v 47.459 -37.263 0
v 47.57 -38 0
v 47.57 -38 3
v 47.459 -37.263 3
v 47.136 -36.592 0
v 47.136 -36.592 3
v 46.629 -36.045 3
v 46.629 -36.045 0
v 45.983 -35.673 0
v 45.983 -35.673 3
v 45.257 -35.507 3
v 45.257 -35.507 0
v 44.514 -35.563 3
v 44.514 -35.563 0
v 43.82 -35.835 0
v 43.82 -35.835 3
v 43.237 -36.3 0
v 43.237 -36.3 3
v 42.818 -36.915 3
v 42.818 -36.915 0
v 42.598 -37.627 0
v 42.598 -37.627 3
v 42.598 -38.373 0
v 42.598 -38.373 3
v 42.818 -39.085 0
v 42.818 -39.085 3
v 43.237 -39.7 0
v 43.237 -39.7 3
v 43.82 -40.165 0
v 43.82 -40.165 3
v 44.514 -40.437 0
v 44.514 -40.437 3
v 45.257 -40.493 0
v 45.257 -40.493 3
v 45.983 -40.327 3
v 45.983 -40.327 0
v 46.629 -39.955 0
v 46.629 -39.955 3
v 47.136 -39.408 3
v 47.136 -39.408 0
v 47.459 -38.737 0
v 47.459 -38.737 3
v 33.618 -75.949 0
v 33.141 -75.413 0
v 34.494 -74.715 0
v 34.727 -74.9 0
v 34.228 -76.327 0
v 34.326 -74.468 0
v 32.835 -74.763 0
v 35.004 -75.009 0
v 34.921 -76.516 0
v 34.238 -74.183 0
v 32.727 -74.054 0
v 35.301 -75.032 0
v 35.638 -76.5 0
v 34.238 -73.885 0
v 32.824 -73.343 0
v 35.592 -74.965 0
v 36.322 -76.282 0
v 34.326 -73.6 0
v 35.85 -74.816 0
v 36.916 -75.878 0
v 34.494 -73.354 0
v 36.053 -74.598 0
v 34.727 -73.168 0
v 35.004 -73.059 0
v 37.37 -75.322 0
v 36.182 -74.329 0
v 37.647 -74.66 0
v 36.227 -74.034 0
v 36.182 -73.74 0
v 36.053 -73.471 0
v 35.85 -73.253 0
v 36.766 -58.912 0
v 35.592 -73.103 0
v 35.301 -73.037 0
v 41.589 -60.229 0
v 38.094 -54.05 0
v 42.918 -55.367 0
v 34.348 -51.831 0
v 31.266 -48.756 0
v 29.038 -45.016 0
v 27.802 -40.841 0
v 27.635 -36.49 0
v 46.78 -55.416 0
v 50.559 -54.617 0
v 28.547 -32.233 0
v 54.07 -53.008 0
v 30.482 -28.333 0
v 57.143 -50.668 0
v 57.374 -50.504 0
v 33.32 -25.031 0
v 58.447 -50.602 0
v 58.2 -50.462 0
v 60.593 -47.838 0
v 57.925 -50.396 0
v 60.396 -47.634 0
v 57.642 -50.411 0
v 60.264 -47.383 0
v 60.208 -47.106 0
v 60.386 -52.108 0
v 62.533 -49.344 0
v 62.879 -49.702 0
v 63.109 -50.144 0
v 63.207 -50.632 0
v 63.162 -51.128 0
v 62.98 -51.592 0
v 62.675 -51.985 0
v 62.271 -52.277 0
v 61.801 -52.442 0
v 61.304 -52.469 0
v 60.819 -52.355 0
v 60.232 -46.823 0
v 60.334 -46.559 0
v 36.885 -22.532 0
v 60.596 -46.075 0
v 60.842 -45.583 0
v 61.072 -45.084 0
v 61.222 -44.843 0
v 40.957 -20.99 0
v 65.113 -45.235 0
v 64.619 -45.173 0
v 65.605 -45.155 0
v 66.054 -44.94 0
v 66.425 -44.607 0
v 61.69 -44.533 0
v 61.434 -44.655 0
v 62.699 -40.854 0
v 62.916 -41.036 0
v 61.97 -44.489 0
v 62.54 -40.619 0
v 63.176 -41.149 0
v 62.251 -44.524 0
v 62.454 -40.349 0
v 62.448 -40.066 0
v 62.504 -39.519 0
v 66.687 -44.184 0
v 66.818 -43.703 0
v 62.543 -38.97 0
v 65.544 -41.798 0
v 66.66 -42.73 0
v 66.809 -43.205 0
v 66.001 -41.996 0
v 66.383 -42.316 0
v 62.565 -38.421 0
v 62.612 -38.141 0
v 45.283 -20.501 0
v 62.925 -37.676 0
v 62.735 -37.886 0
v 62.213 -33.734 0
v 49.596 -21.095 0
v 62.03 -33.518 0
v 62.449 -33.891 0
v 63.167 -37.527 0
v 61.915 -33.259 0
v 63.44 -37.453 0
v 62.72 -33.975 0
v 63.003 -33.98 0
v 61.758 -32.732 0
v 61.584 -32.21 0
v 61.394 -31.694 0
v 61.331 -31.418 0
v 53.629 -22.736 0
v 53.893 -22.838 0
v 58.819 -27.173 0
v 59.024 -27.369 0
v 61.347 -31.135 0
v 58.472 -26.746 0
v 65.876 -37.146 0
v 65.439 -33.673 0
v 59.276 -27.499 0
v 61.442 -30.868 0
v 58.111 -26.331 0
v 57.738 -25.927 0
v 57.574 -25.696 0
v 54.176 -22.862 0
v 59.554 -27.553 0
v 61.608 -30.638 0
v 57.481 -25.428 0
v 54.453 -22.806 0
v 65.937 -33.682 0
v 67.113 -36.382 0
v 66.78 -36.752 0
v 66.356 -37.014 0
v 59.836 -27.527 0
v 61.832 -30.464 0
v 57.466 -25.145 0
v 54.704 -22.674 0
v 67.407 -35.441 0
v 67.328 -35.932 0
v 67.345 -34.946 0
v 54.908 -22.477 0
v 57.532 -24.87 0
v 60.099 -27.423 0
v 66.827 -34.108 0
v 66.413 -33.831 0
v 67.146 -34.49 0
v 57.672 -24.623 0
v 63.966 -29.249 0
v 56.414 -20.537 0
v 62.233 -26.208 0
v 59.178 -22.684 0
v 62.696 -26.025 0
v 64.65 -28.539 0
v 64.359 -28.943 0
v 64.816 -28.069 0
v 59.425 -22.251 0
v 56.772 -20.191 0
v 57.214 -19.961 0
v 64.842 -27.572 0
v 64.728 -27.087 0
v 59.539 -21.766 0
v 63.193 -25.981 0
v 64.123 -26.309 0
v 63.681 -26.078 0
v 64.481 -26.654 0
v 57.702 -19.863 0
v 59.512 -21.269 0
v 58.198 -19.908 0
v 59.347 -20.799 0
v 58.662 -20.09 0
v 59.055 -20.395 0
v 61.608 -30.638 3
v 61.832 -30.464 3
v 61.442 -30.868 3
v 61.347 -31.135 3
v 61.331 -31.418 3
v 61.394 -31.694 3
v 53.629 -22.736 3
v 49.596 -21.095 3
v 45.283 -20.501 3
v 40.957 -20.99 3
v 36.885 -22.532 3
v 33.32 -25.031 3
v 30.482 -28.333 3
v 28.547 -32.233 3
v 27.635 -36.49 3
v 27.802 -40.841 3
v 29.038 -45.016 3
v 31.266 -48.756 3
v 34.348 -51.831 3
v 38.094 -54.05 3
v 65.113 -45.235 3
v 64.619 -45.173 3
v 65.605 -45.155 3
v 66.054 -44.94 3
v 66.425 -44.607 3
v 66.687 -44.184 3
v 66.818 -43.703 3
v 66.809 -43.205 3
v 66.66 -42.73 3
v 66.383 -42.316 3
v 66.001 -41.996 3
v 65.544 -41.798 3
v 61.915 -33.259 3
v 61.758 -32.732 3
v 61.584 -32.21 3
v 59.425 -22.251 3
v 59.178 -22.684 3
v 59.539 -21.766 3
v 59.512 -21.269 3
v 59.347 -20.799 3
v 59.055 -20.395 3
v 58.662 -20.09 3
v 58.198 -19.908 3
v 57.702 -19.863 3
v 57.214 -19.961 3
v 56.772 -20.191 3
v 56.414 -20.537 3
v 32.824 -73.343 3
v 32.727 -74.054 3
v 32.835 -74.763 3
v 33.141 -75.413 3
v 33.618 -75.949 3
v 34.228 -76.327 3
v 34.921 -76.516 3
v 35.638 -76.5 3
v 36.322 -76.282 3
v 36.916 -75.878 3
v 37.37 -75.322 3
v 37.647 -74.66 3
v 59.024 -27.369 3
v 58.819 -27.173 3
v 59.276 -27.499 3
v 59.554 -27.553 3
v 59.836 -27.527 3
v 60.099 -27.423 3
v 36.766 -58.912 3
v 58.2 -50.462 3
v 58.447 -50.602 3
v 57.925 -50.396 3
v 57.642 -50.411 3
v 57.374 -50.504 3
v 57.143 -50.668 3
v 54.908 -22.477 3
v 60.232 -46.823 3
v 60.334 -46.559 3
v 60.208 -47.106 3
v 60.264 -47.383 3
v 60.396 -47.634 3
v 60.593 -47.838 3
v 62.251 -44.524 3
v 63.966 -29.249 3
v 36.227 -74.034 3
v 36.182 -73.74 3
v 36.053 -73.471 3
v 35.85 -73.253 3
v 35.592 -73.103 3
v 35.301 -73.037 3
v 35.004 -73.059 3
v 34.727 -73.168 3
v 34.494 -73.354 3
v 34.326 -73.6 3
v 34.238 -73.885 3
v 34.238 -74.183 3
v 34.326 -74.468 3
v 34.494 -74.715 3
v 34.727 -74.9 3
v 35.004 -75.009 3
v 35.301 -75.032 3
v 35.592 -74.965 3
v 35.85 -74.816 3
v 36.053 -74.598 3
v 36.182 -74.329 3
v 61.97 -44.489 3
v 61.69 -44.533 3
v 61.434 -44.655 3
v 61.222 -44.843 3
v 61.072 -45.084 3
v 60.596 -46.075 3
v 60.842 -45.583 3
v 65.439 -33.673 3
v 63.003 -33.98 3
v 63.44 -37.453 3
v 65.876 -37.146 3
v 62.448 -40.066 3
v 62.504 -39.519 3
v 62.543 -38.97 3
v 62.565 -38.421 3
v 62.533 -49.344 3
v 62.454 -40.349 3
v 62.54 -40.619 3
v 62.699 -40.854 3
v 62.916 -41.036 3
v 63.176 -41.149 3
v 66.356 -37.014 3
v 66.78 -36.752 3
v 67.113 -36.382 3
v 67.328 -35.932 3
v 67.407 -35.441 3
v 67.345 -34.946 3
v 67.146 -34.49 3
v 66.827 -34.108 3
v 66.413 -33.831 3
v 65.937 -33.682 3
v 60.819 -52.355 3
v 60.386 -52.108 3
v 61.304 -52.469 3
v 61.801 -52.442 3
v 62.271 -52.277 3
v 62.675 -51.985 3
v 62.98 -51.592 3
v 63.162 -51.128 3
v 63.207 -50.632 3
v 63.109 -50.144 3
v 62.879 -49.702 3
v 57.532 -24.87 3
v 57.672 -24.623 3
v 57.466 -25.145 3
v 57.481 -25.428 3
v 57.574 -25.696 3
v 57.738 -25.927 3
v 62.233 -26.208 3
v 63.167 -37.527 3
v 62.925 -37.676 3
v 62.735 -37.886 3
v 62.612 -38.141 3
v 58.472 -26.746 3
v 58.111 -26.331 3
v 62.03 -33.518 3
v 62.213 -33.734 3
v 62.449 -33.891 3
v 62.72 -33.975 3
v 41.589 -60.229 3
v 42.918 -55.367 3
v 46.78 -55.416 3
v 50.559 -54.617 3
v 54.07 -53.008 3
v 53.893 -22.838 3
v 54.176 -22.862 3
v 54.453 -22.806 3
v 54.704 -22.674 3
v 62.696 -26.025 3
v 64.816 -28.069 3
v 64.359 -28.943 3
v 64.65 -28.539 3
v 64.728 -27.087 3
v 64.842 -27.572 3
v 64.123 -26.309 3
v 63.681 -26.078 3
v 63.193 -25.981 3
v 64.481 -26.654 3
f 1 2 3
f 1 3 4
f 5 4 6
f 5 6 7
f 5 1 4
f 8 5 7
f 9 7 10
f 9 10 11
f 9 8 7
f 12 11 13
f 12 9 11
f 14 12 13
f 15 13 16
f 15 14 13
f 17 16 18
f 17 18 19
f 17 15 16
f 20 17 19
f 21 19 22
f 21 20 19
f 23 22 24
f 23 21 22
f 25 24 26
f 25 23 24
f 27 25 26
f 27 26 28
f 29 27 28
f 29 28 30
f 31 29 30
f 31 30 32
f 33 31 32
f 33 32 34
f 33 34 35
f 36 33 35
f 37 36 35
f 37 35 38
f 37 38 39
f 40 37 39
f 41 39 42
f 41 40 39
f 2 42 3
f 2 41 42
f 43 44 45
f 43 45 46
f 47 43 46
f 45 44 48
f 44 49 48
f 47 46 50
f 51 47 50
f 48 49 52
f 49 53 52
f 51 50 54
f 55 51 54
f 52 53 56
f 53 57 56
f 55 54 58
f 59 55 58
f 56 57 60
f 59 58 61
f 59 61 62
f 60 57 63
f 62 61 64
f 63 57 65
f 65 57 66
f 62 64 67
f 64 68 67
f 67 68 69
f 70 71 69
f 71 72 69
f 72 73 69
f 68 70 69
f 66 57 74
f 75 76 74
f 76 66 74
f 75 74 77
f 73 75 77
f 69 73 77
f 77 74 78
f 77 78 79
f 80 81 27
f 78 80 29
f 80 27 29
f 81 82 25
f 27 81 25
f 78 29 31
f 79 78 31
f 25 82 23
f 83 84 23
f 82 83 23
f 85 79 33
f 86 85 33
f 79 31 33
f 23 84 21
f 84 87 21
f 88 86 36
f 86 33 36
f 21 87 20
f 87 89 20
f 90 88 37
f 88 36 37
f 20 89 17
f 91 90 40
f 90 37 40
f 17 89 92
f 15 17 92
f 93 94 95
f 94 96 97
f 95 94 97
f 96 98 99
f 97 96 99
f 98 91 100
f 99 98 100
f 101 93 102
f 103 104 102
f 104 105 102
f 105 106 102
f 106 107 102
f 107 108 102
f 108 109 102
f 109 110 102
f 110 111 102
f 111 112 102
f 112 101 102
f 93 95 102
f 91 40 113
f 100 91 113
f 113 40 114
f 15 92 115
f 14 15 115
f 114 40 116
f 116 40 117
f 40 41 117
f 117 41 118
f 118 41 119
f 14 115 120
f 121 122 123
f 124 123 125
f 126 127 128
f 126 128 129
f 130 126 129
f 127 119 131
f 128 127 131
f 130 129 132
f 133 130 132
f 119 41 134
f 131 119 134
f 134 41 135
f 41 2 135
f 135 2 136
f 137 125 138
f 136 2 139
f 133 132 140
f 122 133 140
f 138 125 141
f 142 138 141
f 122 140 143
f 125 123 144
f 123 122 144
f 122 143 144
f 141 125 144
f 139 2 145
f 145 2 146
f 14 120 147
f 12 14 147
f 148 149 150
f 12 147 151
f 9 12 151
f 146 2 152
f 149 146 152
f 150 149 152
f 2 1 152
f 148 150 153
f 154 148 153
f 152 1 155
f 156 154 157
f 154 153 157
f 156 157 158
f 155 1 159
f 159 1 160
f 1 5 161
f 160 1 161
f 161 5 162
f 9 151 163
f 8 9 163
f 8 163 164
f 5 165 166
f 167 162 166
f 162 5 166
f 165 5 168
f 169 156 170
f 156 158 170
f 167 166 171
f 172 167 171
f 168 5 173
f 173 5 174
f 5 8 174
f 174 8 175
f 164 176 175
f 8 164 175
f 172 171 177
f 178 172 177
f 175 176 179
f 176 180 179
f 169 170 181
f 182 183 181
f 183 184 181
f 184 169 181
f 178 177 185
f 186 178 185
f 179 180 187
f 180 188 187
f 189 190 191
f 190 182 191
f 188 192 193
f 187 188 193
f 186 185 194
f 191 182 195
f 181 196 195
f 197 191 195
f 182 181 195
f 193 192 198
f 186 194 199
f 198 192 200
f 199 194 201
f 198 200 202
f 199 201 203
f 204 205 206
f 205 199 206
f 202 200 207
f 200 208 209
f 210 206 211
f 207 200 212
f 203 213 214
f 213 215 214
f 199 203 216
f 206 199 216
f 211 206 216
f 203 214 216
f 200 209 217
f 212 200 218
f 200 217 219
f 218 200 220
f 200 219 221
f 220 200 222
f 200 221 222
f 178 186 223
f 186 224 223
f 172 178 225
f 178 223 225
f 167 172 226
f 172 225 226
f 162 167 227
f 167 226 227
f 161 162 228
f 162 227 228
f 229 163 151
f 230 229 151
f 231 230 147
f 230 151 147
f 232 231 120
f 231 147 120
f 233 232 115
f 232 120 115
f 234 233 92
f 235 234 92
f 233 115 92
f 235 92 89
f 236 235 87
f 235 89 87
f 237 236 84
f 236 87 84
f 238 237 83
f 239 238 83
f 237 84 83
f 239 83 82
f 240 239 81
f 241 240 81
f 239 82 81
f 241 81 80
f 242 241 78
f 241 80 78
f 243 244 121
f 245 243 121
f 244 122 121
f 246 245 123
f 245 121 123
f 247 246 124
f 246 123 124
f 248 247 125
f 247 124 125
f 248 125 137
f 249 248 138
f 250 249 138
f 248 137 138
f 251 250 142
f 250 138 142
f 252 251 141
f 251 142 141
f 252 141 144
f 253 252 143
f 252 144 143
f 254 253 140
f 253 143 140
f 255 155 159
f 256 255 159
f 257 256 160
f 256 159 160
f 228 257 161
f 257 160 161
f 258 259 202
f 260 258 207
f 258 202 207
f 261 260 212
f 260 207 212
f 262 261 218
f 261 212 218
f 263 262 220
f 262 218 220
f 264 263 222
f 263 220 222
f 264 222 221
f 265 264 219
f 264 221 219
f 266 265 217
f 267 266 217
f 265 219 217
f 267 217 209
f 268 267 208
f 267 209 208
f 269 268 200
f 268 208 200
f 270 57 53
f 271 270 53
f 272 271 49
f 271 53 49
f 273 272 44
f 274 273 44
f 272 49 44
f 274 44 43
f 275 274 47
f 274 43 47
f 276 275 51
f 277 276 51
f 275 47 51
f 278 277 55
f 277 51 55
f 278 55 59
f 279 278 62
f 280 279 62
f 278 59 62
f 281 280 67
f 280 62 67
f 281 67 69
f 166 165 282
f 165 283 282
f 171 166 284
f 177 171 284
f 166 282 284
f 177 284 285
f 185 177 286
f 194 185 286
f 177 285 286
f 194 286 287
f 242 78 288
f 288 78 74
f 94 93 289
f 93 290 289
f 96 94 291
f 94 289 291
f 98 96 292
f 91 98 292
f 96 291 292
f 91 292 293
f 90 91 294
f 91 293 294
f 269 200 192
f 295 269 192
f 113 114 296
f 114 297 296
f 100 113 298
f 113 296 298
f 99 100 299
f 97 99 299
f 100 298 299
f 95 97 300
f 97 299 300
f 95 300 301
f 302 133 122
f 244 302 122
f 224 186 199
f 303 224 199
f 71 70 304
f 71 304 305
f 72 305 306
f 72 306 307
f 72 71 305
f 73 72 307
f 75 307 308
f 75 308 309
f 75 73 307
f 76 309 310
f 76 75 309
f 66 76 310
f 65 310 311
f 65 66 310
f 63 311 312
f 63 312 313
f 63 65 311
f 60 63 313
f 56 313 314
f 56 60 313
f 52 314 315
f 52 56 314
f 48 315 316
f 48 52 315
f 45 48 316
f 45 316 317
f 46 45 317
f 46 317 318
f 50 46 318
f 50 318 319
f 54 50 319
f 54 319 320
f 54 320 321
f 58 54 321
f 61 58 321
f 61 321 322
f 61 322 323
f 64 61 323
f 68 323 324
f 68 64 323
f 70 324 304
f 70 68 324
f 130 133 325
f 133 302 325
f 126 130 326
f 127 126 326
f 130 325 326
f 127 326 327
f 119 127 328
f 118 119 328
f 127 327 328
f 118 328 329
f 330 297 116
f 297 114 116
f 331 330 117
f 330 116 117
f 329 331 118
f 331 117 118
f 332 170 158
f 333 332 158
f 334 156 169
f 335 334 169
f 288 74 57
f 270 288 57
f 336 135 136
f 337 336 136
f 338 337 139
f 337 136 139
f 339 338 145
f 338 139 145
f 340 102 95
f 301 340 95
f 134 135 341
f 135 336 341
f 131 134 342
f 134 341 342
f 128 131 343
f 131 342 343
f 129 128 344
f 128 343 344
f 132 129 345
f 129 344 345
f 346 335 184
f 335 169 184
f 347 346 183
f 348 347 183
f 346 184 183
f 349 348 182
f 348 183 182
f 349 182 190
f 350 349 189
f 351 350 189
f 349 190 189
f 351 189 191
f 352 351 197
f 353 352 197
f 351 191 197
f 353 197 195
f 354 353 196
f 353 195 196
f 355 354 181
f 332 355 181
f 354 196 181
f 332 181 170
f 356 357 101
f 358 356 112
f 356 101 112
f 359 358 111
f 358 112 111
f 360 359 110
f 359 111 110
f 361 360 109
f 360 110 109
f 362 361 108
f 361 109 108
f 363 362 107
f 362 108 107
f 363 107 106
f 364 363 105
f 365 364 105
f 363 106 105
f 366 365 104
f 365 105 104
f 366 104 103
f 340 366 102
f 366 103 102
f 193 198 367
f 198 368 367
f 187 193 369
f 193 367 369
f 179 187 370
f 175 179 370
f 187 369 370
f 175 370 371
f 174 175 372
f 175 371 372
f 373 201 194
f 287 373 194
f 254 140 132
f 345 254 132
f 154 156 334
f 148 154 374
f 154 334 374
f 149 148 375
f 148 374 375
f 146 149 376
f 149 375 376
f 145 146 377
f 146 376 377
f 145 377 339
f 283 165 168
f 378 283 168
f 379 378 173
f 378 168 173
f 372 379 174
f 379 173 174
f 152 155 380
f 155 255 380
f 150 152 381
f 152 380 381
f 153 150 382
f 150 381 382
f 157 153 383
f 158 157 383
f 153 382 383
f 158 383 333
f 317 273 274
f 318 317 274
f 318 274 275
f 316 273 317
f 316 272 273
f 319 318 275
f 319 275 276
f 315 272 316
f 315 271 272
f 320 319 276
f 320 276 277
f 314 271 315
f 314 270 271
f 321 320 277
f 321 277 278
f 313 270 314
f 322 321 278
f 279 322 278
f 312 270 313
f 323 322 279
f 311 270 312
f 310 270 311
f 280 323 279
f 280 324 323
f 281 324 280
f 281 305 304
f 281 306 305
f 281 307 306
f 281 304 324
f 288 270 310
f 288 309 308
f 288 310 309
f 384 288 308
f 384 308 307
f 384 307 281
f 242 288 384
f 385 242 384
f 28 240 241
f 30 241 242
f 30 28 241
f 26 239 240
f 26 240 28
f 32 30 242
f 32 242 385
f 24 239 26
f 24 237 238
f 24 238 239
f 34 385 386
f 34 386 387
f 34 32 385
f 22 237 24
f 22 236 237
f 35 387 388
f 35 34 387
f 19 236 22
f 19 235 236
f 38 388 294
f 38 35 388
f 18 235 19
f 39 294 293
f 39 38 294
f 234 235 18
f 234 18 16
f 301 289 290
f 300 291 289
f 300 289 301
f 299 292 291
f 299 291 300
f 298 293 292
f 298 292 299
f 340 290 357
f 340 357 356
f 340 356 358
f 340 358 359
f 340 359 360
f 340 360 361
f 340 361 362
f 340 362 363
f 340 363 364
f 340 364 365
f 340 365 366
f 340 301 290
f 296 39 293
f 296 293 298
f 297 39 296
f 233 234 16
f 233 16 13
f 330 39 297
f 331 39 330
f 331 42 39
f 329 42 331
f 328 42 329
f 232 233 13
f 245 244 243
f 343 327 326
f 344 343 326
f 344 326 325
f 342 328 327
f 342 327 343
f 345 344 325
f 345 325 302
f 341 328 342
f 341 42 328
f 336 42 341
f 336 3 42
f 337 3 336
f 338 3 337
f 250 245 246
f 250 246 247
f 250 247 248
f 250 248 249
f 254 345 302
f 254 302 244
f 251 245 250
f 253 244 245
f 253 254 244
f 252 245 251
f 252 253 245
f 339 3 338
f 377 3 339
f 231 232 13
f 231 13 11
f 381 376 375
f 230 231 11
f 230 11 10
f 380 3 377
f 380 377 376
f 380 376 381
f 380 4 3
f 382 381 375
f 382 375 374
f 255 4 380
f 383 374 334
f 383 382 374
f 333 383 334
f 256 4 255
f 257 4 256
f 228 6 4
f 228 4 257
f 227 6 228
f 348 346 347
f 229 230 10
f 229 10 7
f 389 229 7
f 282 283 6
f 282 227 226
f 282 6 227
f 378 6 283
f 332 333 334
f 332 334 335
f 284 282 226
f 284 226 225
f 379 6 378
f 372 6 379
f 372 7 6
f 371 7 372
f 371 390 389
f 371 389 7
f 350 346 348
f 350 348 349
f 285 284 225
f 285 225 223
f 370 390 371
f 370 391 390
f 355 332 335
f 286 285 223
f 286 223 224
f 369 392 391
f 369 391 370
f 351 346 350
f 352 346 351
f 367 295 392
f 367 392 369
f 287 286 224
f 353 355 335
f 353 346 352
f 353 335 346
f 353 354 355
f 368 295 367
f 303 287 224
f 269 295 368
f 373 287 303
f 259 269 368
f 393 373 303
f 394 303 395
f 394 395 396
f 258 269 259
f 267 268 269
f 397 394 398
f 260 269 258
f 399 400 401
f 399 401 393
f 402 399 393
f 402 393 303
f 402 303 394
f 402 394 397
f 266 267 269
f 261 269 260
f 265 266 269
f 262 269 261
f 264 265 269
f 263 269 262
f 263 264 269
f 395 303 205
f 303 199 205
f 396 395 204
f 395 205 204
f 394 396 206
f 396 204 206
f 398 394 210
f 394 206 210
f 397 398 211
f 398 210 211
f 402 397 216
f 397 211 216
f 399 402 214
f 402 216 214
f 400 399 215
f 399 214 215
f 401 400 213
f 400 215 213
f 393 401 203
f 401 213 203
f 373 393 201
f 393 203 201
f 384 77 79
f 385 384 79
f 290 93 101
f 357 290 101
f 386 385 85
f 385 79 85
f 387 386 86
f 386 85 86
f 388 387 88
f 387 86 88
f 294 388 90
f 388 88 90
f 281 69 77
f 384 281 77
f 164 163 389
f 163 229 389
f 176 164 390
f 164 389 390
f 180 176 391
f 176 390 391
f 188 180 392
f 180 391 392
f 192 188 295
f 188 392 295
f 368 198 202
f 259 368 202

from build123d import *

# Parameters (mm, degrees)
SKETCH1_R           = 17.5
SKETCH1_R_2         = 2.5
SKETCH1_R_3         = 1.75
SKETCH1_R_4         = 1
BOSS_EXTRUDE1_DEPTH = 3
FILLET1_R           = 1


with BuildPart() as part:
    # Sketch1 → Boss-Extrude1 (new body)
    # profile 1 of 13: a face of its own
    with BuildSketch(Plane.XY):
        with Locations((45.07, -38)):
            Circle(SKETCH1_R)
        with Locations((45.07, -38)):
            Circle(SKETCH1_R_2, mode=Mode.SUBTRACT)
    # profile 2 of 13: a face of its own
    with BuildSketch(Plane.XY):
        with BuildLine():
            ThreePointArc((59.178313279, -22.683979093), (56.722798651, -22.992925548), (56.413852196, -20.53741092))
            Line((56.413852196, -20.53741092), (54.366811281, -23.173695673))
            ThreePointArc((54.366811281, -23.173695673), (55.802840863, -24.177694584), (57.131272364, -25.320263845))
            Line((57.131272364, -25.320263845), (59.178313279, -22.683979093))
        make_face()
    # profile 3 of 13: a face of its own
    with BuildSketch(Plane.XY):
        with Locations((57.796082737, -21.610695007)):
            Circle(SKETCH1_R_3)
    # profile 4 of 13: a face of its own
    with BuildSketch(Plane.XY):
        with Locations((63.099282859, -27.728317587)):
            Circle(SKETCH1_R_3)
    # profile 5 of 13: a face of its own
    with BuildSketch(Plane.XY):
        with BuildLine():
            Line((62.23299639, -26.207775659), (59.33291469, -27.860016541))
            ThreePointArc((59.33291469, -27.860016541), (60.275419279, -29.337135314), (61.065487627, -30.901100396))
            Line((61.065487627, -30.901100396), (63.965569327, -29.248859515))
            ThreePointArc((63.965569327, -29.248859515), (61.578740931, -28.594604056), (62.23299639, -26.207775659))
        make_face()
    # profile 6 of 13: a face of its own
    with BuildSketch(Plane.XY):
        with BuildLine():
            ThreePointArc((65.876146235, -37.146021746), (63.921377057, -35.628168835), (65.439229968, -33.673399657))
            Line((65.439229968, -33.673399657), (62.12761863, -34.090057971))
            ThreePointArc((62.12761863, -34.090057971), (62.433110447, -35.815418664), (62.564534897, -37.56268006))
            Line((62.564534897, -37.56268006), (65.876146235, -37.146021746))
        make_face()
    # profile 7 of 13: a face of its own
    with BuildSketch(Plane.XY):
        with Locations((65.657688101, -35.409710702)):
            Circle(SKETCH1_R_3)
    # profile 8 of 13: a face of its own
    with BuildSketch(Plane.XY):
        with BuildLine():
            ThreePointArc((62.325454762, -40.915352631), (61.947425446, -42.626284719), (61.400197818, -44.29083772))
            Line((61.400197818, -44.29083772), (64.619175986, -45.173194426))
            ThreePointArc((64.619175986, -45.173194426), (63.394061913, -43.022823409), (65.54443293, -41.797709336))
            Line((65.54443293, -41.797709336), (62.325454762, -40.915352631))
        make_face()
    # profile 9 of 13: a face of its own
    with BuildSketch(Plane.XY):
        with Locations((65.081804458, -43.485451881)):
            Circle(SKETCH1_R_3)
    # profile 10 of 13: a face of its own
    with BuildSketch(Plane.XY):
        with Locations((61.459304993, -50.726082737)):
            Circle(SKETCH1_R_3)
    # profile 11 of 13: a face of its own
    with BuildSketch(Plane.XY):
        with BuildLine():
            ThreePointArc((59.896304327, -47.296811281), (58.892305416, -48.732840863), (57.749736155, -50.061272364))
            Line((57.749736155, -50.061272364), (60.386020907, -52.108313279))
            ThreePointArc((60.386020907, -52.108313279), (60.077074452, -49.652798651), (62.53258908, -49.343852196))
            Line((62.53258908, -49.343852196), (59.896304327, -47.296811281))
        make_face()
    # profile 12 of 13: a face of its own
    with BuildSketch(Plane.XY):
        with BuildLine():
            ThreePointArc((42.917509319, -55.367117892), (40.458569889, -54.881490228), (38.094226397, -54.049566432))
            Line((38.094226397, -54.049566432), (36.76608928, -58.911601248))
            ThreePointArc((36.76608928, -58.911601248), (39.141018428, -59.704773151), (41.589372203, -60.229152708))
            Line((41.589372203, -60.229152708), (42.917509319, -55.367117892))
        make_face()
    # profile 13 of 13: a face of its own
    with BuildSketch(Plane.XY):
        with BuildLine():
            ThreePointArc((41.589372203, -60.229152708), (39.141018428, -59.704773151), (36.76608928, -58.911601248))
            Line((36.76608928, -58.911601248), (32.824020556, -73.342698121))
            ThreePointArc((32.824020556, -73.342698121), (34.567840149, -76.446231348), (37.647303478, -74.660249581))
            Line((37.647303478, -74.660249581), (41.589372203, -60.229152708))
        make_face()
        with Locations((35.226677147, -74.034365596)):
            Circle(SKETCH1_R_4, mode=Mode.SUBTRACT)
    extrude(amount=BOSS_EXTRUDE1_DEPTH)

    # Fillet1
    fillet1_edges = [part.edges().sort_by_distance(p)[0] for p in [
        (62.325454762, -40.915352631, 1.5),
        (61.400197818, -44.29083772, 1.5),
        (59.896304327, -47.296811281, 1.5),
        (57.749736155, -50.061272364, 1.5),
        (54.366811281, -23.173695673, 1.5),
        (57.131272364, -25.320263845, 1.5),
        (59.33291469, -27.860016541, 1.5),
        (61.065487627, -30.901100396, 1.5),
        (62.12761863, -34.090057971, 1.5),
        (62.564534897, -37.56268006, 1.5),
    ]]
    fillet(fillet1_edges, radius=FILLET1_R)


solid = part.part
